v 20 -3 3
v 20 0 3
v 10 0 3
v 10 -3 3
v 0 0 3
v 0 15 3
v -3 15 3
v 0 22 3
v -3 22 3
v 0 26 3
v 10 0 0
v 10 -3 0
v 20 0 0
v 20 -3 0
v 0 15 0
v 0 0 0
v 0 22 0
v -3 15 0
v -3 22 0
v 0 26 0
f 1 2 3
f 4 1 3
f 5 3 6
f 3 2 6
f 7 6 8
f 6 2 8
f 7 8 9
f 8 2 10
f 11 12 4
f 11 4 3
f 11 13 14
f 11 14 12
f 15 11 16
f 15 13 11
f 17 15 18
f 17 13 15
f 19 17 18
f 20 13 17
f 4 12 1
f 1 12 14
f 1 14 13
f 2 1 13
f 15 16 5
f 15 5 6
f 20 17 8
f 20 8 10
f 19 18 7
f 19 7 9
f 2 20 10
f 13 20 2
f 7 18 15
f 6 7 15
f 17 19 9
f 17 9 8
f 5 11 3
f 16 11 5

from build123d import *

# Parameters (mm, degrees)
CROQUIS1_W              = 3
CROQUIS1_H              = 7
CROQUIS1_W_2            = 10
CROQUIS1_H_2            = 3
SALIENTE_EXTRUIR1_DEPTH = 3


with BuildPart() as part:
    # Croquis1 → Saliente-Extruir1 (new body)
    with BuildSketch(Plane.XY):
        Polygon((20, 0), (0, 0), (0, 26), align=None)
        with Locations((-1.5, 18.5)):
            Rectangle(CROQUIS1_W, CROQUIS1_H)
        with Locations((15, -1.5)):
            Rectangle(CROQUIS1_W_2, CROQUIS1_H_2)
    extrude(amount=SALIENTE_EXTRUIR1_DEPTH)


solid = part.part
